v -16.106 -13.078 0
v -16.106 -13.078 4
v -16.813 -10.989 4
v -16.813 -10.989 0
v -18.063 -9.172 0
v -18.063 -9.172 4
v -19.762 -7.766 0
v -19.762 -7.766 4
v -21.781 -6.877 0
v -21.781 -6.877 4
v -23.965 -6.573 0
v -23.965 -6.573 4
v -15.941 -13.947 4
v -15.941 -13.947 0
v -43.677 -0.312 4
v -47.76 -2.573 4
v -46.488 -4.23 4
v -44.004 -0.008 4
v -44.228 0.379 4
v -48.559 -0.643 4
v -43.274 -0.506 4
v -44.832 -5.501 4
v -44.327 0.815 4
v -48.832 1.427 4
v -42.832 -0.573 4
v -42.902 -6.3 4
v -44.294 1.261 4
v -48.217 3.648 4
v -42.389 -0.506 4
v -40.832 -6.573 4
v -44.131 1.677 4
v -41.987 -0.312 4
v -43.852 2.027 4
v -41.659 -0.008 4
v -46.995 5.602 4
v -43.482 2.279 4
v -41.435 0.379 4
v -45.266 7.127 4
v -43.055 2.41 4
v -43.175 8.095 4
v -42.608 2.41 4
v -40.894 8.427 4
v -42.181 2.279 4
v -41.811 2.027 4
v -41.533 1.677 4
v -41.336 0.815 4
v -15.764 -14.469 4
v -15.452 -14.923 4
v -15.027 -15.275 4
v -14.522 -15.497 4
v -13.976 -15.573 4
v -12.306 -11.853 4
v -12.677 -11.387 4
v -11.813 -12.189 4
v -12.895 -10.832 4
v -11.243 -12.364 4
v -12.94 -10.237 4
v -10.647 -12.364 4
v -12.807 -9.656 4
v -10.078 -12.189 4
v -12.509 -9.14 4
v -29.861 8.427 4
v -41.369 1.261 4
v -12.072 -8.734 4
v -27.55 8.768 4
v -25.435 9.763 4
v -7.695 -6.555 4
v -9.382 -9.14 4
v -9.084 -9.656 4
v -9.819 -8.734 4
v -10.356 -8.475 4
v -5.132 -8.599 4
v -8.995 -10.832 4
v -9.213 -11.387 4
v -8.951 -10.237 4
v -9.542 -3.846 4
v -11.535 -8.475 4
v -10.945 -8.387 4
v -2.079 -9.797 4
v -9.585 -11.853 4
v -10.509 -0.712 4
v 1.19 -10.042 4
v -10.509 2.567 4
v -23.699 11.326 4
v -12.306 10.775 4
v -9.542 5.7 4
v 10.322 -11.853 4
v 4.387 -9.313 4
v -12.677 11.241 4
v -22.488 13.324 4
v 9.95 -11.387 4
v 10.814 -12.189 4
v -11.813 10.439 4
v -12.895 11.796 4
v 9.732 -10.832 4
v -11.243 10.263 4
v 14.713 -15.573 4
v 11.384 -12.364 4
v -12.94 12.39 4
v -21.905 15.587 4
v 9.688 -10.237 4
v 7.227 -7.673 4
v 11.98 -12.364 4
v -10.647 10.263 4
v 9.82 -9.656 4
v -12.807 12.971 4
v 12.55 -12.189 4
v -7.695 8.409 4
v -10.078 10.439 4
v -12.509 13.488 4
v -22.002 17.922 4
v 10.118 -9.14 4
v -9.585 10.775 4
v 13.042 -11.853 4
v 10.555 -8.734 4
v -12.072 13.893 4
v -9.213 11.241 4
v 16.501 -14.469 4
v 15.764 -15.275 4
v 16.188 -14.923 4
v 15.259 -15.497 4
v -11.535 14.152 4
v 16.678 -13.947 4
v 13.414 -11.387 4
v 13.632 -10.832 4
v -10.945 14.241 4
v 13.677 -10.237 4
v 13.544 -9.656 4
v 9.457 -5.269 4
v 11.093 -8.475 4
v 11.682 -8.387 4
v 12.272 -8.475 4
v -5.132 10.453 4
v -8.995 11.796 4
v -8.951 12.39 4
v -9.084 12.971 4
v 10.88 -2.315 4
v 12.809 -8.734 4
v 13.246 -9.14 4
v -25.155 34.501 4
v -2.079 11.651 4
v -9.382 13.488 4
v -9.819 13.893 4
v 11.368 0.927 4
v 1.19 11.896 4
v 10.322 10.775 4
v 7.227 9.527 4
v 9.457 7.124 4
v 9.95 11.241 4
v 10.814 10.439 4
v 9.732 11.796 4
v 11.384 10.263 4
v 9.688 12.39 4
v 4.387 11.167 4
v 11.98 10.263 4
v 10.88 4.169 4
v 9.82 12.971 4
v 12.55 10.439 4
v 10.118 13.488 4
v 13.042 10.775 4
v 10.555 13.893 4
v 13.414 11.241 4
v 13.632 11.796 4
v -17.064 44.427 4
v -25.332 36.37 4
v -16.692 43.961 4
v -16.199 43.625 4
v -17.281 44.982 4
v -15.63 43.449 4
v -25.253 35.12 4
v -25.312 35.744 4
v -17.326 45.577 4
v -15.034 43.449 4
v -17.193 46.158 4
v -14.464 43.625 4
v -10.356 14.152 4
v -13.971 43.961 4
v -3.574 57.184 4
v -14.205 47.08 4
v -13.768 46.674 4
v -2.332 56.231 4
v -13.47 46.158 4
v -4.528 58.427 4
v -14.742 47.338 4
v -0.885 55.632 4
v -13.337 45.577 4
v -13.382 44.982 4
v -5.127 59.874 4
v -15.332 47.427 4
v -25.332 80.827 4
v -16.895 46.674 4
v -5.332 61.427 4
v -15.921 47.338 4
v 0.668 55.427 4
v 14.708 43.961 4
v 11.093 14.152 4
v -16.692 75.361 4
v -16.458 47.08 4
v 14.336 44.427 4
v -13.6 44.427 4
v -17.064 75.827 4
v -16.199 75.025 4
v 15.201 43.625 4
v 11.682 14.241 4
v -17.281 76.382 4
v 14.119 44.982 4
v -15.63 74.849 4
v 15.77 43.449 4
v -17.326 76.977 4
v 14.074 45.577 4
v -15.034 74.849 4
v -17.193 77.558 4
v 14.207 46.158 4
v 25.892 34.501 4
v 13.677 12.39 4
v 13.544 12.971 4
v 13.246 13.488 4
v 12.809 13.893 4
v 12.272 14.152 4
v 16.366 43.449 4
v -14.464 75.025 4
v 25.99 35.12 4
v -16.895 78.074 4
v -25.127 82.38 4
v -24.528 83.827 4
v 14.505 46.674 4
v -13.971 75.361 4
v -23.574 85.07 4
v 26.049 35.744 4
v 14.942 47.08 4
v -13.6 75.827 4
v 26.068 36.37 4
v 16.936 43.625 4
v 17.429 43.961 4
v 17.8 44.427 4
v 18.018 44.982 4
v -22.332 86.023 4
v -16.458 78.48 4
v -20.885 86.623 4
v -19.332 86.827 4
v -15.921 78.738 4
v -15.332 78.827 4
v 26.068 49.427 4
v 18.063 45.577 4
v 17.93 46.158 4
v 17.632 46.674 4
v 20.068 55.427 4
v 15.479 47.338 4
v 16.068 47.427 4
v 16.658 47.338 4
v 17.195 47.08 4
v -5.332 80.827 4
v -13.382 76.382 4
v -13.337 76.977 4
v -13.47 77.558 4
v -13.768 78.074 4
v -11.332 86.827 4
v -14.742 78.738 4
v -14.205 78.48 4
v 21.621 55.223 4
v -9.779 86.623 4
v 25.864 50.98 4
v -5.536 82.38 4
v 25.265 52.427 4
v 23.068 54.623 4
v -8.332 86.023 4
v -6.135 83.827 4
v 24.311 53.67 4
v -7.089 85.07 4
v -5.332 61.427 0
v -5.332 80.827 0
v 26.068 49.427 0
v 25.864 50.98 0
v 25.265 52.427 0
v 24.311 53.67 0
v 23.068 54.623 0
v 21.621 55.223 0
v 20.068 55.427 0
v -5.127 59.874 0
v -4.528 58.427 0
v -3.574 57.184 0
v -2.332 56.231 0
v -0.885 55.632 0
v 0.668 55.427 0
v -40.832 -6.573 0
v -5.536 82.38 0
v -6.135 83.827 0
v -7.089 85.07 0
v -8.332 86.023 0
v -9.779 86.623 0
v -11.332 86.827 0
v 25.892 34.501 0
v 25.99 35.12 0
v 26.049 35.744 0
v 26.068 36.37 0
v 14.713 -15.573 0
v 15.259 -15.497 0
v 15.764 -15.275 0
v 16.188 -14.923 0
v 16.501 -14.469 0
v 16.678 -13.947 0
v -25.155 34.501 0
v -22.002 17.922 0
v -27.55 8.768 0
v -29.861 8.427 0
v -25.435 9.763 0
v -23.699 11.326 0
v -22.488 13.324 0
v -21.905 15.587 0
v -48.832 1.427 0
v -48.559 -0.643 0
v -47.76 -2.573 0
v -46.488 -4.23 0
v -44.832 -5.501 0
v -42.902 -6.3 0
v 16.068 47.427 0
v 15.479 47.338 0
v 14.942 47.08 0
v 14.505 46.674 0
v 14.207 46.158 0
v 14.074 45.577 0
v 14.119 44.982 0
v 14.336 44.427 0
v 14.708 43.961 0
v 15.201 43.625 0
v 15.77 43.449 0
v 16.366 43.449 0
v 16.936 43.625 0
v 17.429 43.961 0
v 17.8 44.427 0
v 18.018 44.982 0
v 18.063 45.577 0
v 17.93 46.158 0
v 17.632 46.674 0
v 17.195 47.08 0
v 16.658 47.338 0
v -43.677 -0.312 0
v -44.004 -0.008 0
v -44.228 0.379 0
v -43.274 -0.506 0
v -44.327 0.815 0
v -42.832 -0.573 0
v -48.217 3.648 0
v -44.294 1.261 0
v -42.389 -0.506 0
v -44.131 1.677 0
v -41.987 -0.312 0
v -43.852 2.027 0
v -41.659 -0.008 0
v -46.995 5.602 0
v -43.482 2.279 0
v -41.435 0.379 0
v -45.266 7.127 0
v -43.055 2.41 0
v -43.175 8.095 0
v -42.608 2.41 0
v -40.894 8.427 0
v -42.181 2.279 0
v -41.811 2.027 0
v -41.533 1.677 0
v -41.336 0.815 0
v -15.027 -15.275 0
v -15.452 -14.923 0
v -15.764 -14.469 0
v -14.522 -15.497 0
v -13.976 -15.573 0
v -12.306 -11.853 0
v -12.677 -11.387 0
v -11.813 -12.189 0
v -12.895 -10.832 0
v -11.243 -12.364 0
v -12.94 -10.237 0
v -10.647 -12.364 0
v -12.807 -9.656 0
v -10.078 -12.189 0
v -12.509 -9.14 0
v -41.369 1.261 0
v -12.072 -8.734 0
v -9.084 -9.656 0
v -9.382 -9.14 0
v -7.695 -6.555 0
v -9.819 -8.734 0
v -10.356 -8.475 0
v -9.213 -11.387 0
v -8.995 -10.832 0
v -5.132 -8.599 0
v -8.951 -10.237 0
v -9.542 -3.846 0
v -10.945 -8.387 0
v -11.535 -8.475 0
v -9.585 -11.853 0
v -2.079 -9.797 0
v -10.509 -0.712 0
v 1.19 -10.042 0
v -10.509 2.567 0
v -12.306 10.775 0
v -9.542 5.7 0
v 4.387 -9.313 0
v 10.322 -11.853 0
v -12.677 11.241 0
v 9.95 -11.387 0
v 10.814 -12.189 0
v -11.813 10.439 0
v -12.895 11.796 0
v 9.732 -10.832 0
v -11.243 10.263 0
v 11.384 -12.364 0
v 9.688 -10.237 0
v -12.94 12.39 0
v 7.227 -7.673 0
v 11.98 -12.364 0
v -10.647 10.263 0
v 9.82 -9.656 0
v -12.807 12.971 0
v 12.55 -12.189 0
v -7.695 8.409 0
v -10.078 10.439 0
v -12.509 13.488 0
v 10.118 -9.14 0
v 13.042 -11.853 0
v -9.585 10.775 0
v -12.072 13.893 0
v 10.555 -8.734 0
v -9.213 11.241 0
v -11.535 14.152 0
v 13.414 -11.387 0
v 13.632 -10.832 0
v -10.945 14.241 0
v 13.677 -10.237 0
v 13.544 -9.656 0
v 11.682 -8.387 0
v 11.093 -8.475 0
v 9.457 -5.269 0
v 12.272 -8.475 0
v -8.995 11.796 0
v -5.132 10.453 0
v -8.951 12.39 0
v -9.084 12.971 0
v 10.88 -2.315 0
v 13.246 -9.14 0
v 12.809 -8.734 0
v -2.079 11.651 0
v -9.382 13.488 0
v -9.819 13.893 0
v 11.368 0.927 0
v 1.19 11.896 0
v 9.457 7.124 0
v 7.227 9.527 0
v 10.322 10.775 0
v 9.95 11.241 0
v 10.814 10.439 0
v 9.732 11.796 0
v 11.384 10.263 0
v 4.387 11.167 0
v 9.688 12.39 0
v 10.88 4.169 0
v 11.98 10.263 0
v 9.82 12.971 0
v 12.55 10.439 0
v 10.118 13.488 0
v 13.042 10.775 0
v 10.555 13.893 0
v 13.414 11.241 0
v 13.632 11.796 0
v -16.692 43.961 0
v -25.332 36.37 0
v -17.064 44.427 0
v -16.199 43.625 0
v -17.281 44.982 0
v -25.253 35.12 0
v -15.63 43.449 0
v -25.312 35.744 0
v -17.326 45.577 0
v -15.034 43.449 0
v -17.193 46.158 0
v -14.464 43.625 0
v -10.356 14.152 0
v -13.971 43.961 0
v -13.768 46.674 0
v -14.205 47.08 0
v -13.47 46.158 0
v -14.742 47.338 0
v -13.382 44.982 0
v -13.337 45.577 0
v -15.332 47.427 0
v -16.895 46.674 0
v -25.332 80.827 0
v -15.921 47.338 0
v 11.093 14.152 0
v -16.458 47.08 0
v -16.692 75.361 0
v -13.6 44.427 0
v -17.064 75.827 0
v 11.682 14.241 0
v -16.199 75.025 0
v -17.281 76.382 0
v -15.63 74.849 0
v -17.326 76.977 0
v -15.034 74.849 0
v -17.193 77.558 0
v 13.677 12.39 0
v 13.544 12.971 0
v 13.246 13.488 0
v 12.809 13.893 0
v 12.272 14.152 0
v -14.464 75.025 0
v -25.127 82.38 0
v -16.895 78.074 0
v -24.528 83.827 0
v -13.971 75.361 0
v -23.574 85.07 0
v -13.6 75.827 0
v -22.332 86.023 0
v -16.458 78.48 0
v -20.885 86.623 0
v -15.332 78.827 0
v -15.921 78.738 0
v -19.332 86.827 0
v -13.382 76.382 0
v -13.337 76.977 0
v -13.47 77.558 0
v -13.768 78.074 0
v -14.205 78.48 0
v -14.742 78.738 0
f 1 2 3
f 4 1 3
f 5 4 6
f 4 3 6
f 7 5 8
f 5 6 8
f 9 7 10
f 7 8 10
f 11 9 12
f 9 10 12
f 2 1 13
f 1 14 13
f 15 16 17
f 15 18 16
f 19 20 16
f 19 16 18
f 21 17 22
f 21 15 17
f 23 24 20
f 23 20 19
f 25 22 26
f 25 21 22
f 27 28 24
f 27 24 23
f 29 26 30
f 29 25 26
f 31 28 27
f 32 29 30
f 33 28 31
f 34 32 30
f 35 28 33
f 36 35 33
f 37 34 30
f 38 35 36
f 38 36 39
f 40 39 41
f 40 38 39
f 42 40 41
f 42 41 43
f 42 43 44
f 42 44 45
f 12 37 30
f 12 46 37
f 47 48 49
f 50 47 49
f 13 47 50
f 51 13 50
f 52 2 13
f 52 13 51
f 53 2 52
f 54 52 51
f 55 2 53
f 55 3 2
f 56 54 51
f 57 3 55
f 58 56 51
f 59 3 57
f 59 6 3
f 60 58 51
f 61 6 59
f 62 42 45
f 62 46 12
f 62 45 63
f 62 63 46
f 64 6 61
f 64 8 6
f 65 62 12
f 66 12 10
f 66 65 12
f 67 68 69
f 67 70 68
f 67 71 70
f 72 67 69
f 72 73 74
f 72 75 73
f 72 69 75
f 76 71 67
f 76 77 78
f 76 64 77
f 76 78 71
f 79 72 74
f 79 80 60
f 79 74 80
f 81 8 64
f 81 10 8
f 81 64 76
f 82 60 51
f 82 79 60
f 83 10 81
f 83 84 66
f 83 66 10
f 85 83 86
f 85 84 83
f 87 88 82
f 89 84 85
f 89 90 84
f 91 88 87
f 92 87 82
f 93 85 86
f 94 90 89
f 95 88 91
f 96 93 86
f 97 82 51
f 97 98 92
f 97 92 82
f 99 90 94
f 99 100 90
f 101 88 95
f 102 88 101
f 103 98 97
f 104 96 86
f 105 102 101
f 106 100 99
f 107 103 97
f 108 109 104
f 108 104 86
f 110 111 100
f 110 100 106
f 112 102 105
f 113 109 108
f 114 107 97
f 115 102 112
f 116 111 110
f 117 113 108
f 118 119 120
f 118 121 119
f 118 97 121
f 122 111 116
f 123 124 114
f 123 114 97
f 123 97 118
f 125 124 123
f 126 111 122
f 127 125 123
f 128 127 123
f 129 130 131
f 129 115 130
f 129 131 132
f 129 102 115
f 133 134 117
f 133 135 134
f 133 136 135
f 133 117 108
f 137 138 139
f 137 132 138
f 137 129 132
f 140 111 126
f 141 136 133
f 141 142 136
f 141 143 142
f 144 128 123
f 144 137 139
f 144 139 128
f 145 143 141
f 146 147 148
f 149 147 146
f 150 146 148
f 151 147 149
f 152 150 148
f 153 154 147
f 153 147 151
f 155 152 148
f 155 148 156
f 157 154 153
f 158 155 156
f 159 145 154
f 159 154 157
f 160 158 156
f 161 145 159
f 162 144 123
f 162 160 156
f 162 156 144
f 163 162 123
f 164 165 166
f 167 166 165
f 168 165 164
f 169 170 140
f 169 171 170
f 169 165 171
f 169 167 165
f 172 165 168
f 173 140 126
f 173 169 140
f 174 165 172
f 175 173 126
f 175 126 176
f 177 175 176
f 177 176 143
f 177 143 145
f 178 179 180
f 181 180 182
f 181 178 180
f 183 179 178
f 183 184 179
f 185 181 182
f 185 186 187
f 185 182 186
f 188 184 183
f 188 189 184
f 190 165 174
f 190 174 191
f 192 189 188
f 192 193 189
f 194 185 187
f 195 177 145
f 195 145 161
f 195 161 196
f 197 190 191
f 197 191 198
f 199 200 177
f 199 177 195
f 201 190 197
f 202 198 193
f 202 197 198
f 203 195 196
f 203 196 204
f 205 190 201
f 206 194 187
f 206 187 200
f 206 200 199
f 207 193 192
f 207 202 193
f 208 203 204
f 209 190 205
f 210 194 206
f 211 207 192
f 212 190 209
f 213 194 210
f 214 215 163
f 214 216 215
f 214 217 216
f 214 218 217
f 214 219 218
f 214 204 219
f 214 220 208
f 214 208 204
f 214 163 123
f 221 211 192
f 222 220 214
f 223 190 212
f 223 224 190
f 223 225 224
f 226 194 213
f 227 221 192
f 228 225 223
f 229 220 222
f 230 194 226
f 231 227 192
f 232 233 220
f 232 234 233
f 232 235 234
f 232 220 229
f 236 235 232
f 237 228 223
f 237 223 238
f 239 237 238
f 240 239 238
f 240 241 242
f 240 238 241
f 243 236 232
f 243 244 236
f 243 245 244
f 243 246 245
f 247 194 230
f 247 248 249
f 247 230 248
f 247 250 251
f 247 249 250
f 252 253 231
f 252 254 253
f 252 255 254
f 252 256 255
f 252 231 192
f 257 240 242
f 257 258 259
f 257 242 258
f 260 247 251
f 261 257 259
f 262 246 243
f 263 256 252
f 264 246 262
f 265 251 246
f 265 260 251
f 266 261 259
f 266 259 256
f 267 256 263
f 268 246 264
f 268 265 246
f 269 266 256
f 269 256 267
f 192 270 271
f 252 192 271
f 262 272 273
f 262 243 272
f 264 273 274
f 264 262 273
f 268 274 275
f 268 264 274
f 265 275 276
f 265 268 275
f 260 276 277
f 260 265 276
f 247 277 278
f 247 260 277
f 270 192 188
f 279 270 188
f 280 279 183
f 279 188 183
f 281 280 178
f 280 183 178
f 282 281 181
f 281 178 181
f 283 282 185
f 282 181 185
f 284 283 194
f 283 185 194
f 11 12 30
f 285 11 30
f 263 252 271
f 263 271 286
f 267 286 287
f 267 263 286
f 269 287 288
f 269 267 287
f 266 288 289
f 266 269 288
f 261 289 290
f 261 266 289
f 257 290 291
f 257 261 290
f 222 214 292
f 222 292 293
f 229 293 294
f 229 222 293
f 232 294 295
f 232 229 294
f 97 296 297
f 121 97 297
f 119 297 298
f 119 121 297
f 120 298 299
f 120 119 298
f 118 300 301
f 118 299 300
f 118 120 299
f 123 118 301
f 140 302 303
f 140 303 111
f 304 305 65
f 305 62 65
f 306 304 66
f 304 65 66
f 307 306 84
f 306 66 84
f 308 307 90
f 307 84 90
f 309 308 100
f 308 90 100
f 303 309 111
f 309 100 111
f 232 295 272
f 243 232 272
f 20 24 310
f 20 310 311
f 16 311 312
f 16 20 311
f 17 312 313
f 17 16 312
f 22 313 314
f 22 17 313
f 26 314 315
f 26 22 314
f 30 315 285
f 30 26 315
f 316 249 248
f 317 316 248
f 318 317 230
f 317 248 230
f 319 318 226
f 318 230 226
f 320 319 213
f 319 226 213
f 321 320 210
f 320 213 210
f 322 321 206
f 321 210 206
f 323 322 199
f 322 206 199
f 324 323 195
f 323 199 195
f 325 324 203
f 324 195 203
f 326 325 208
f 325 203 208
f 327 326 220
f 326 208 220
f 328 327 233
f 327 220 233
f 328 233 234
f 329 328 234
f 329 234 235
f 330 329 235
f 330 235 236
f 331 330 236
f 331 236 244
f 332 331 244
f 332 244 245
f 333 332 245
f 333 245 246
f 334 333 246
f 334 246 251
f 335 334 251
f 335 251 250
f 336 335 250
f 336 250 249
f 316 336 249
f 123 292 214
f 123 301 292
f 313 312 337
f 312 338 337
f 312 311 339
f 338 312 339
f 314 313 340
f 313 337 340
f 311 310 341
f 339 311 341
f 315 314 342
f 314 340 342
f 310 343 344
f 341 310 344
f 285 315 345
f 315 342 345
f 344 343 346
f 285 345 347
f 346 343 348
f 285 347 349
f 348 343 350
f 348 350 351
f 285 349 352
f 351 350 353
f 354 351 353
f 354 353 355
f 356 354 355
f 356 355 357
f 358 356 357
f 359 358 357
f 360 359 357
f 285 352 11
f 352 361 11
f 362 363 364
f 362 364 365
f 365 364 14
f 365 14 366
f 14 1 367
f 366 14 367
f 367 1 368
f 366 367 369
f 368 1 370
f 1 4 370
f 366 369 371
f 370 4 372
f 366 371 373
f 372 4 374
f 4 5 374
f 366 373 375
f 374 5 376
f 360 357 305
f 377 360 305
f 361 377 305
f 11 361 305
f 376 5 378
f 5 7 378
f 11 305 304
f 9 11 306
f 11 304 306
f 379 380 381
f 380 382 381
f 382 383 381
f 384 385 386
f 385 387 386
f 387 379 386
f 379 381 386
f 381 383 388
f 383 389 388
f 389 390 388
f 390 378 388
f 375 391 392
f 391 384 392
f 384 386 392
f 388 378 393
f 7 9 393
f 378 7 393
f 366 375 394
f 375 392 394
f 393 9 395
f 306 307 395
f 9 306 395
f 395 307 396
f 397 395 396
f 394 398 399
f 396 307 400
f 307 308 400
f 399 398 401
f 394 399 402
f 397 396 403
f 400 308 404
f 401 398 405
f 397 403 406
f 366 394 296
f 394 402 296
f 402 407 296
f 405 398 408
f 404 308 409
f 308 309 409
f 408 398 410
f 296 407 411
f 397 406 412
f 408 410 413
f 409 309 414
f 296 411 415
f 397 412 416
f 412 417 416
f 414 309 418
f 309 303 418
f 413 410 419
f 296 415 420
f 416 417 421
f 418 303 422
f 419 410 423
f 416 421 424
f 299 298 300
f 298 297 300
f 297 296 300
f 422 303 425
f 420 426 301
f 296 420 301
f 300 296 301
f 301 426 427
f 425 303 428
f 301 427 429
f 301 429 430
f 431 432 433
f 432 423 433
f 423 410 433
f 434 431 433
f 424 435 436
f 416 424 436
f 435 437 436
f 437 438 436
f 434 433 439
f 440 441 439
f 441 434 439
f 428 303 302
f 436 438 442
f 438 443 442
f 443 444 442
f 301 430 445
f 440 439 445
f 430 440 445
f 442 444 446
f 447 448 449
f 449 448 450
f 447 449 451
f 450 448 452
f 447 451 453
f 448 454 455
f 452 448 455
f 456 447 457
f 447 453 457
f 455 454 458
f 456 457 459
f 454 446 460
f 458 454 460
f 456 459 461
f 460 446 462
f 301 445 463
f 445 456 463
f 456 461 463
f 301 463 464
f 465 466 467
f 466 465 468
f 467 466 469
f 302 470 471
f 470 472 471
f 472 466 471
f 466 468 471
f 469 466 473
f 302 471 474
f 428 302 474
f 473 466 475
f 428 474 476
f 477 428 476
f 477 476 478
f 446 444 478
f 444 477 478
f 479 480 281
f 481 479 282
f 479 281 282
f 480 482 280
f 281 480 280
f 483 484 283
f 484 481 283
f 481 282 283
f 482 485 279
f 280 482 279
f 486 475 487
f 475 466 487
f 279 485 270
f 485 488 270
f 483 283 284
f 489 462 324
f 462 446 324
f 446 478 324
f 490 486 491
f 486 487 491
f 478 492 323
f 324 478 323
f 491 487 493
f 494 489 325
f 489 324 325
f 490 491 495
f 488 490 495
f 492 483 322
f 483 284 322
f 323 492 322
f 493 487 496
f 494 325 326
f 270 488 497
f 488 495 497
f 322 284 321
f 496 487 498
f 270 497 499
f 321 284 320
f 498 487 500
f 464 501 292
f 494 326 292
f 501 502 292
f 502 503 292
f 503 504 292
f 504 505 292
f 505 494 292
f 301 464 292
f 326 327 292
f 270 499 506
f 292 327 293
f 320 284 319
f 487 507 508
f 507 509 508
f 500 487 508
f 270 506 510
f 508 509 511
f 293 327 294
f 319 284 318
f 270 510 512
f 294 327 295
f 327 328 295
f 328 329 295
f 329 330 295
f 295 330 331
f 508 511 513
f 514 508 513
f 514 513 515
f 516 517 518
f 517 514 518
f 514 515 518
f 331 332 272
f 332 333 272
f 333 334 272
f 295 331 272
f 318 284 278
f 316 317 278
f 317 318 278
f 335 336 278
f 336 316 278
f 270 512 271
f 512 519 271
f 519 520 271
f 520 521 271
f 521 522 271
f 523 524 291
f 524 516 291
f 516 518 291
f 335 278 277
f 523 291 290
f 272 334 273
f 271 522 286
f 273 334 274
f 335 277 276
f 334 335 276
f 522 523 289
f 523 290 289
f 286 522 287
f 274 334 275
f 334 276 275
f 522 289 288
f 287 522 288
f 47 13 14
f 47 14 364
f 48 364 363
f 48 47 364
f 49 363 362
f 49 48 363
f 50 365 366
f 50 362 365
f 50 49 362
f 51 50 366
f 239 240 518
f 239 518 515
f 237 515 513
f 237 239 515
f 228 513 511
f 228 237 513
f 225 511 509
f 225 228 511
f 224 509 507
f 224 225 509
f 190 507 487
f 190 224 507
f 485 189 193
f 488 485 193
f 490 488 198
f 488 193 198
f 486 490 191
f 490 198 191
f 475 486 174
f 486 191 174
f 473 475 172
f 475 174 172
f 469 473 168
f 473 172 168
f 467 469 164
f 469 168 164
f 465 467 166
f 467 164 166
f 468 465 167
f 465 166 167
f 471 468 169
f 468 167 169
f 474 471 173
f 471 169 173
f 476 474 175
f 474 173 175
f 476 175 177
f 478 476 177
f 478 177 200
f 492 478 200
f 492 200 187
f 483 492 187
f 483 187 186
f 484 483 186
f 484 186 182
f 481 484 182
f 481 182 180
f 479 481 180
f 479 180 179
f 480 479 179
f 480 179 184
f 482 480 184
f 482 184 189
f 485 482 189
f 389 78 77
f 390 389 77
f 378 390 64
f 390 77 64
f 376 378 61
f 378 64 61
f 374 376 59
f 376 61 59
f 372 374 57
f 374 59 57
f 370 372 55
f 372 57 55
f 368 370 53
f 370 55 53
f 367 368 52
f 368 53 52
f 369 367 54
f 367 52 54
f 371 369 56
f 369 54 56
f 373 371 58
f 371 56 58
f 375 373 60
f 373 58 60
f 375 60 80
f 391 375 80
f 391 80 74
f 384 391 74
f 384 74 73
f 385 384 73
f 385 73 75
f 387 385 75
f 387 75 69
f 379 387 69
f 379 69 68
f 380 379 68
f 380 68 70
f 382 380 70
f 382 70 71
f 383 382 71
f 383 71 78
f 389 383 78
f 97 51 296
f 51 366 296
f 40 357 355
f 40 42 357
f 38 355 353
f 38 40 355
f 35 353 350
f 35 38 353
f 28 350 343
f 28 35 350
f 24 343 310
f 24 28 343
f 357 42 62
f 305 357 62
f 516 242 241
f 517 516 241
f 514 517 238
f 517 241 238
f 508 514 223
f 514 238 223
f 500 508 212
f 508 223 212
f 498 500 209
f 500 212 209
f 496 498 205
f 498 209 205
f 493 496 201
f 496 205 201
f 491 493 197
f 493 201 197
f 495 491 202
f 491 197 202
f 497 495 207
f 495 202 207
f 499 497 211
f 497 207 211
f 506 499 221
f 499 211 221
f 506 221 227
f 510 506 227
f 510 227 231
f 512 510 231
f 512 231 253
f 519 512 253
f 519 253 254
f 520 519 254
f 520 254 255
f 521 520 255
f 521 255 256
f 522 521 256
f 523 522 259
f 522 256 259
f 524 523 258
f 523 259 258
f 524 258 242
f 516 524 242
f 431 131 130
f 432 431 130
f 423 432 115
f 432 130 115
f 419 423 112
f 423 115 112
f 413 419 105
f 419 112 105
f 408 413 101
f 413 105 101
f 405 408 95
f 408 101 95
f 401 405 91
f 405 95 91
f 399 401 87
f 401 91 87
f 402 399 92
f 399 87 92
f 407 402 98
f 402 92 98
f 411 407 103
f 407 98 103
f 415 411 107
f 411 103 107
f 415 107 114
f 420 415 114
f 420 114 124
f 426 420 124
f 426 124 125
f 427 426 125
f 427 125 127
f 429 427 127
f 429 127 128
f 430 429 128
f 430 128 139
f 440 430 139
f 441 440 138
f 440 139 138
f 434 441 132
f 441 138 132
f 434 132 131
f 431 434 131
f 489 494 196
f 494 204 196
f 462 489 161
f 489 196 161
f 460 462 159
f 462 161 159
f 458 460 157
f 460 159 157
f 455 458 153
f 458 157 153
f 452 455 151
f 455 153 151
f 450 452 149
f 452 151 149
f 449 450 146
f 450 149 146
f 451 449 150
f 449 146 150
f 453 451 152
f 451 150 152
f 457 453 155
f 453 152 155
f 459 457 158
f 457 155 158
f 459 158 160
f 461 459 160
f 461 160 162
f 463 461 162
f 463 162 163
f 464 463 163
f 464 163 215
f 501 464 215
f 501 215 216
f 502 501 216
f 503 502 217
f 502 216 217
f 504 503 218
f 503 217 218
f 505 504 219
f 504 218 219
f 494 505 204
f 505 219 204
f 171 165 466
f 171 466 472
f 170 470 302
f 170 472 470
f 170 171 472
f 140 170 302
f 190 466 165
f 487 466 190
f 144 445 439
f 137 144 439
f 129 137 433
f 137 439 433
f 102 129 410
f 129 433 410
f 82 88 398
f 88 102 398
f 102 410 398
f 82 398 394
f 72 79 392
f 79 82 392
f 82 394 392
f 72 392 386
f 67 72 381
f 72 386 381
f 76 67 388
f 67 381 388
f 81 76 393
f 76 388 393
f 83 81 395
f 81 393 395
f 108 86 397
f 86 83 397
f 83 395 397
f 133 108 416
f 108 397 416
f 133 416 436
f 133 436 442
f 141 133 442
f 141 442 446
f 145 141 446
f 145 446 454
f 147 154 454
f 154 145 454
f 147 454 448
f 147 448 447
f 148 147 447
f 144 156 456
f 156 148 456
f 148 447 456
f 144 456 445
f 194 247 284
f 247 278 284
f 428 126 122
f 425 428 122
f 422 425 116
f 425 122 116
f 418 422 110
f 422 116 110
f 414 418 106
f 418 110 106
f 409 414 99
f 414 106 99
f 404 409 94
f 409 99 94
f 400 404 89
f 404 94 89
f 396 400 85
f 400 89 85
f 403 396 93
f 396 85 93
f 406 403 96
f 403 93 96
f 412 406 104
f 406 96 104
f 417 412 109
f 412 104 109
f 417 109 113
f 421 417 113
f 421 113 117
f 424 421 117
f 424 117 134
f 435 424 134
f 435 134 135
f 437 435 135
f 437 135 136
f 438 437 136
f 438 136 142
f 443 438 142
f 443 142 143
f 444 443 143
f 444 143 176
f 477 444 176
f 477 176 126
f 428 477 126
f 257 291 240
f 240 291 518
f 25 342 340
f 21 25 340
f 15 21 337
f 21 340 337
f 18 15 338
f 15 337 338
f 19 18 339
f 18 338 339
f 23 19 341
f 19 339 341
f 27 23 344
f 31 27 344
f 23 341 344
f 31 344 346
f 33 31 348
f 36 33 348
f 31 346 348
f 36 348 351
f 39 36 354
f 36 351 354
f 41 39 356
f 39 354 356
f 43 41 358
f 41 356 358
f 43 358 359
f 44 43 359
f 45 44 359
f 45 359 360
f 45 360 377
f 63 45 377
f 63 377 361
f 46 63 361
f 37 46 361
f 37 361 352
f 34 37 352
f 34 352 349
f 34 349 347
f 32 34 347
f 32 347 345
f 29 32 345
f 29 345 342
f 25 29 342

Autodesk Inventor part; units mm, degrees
ref_plane "YZ Plane" through (0, 0, 0) normal (1, 0, 0) x (0, 1, 0)
ref_plane "XZ Plane" through (0, 0, 0) normal (0, 1, 0) x (-1, 0, 0)
ref_plane "XY Plane" through (0, 0, 0) normal (0, 0, 1) x (1, 0, 0)
sketch "Szkic1" plane through (0, 0, 0) normal (0, 0, 1) x (1, 0, 0)
  line L0 (-25.3316, -15.5729) -> (26.0684, -15.5729)
  line L1 (26.0684, -15.5729) -> (26.0684, 35.4271)
  line L2 (26.0684, 35.4271) -> (26.0684, 35.4271)
  line L3 (26.0684, 35.4271) -> (26.0684, 55.4271)
  line L4 (26.0684, 55.4271) -> (-5.3316, 55.4271)
  line L5 (-5.3316, 55.4271) -> (-5.3316, 86.8271)
  line L6 (-5.3316, 86.8271) -> (-25.3316, 86.8271)
  line L7 (-25.3316, -15.5729) -> (-25.3316, 86.8271)
  line L8 (-15.6316, 16.9271) -> (16.3684, 16.9271)
  line L9 (16.3684, 16.9271) -> (16.3684, -15.0729)
  line L10 (16.3684, -15.0729) -> (-15.6316, -15.0729)
  line L11 (-15.6316, -15.0729) -> (-15.6316, 16.9271)
  circle A0 centre (0.3684, 0.9271) radius 11
  circle A1 centre (0.3684, 0.9271) radius 16
  point P0 (0, 0)
  point P1 (-10.9453, 12.2408)
  point P2 (11.6821, 12.2408)
  point P3 (11.6821, -10.3866)
  point P4 (-10.9453, -10.3866)
  point P5 (16.0684, 45.4271)
  point P6 (-15.3316, 76.8271)
  point P7 (-15.3316, 45.4271)
  dimension "d0" = 20
  dimension "d1" = 20
  dimension "d2" = 51.4
  dimension "d3" = 51.4
  dimension "d4" = 34.5
  dimension "d5" = 25.7
  dimension "d6" = 51.4
  dimension "d7" = 51
  dimension "d8" = 32
  dimension "d9" = 32
  dimension "d10" = 16
  dimension "d11" = 16
  dimension "d12" = 22
  dimension "d13" = 32
  dimension "d23" = 10
  dimension "d24" = 10
  dimension "d25" = 10
  dimension "d26" = 10
  dimension "d27" = 10
  dimension "d28" = 10
extrude "Wyciągnięcie proste1" add sketch "Szkic1" along normal blind 4 contours L7 L6 L5 L4 L3 L1 L0 | L8 A1 L11 | L8 L9 A1 | A1 | A1 L10 L11 | L9 L10 A1
hole "Otwór1" at (0.3684, 0.9271, 0) at (-10.9453, 12.2408, 0) at (11.6821, 12.2408, 0) at (11.6821, -10.3866, 0) at (-10.9453, -10.3866, 0) direction (0, 0, 1) diameter 4 end through all
hole "Otwór2" at (16.0684, 45.4271, 0) at (-15.3316, 76.8271, 0) at (-15.3316, 45.4271, 0) direction (0, 0, 1) diameter 4 end through all
chamfer "Faza1" distance 51 distance2 9.7 1 edges at (-25.3316, -15.5729, 2) measured on face at (-25.3316, 18.5605, 1.3333)
chamfer "Faza2" distance 51 distance2 9.7 1 edges at (26.0684, -15.5729, 2) measured on face at (26.0684, 31.7605, 1.3333)
fillet "Zaokrąglenie2" radius 6 4 edges at (-5.3316, 55.4271, 2) (26.0684, 55.4271, 2) (-5.3316, 86.8271, 2) (-25.3316, 86.8271, 2)
fillet "Zaokrąglenie3" radius 10 2 edges at (-25.3316, 35.4271, 2) (26.0684, 35.4271, 2)
sketch "Szkic2" plane through (0, 0, 4) normal (0, 0, 1) x (1, 0, 0)
  arc A0 (25.8923, 34.5012) -> (26.0684, 36.3697) centre (16.0684, 36.3697) ccw projected
  line L0 (26.0684, 36.3697) -> (26.0684, 49.4271) projected
  arc A1 (26.0684, 49.4271) -> (20.0684, 55.4271) centre (20.0684, 49.4271) ccw projected
  line L1 (20.0684, 55.4271) -> (0.6684, 55.4271) projected
  arc A2 (-5.3316, 61.4271) -> (0.6684, 55.4271) centre (0.6684, 61.4271) ccw projected
  line L2 (-5.3316, 61.4271) -> (-5.3316, 80.8271) projected
  arc A3 (-5.3316, 80.8271) -> (-11.3316, 86.8271) centre (-11.3316, 80.8271) ccw projected
  line L3 (-11.3316, 86.8271) -> (-19.3316, 86.8271) projected
  arc A4 (-19.3316, 86.8271) -> (-25.3316, 80.8271) centre (-19.3316, 80.8271) ccw projected
  line L4 (-25.3316, 80.8271) -> (-25.3316, 36.3697) projected
  arc A5 (-25.3316, 36.3697) -> (-25.1555, 34.5012) centre (-15.3316, 36.3697) ccw projected
  line L5 (-15.6316, -15.5729) -> (-25.1555, 34.5012) projected
  line L6 (-15.6316, -15.5729) -> (16.3684, -15.5729) projected
  line L7 (25.8923, 34.5012) -> (16.3684, -15.5729) projected
  circle A6 centre (-15.3316, 76.8271) radius 2 projected
  circle A7 centre (16.0684, 45.4271) radius 2 projected
  circle A8 centre (-15.3316, 45.4271) radius 2 projected
  circle A9 centre (11.6821, -10.3866) radius 2 projected
  circle A10 centre (-10.9453, 12.2408) radius 2 projected
  circle A11 centre (11.6821, 12.2408) radius 2 projected
  circle A12 centre (-10.9453, -10.3866) radius 2 projected
  circle A13 centre (0.3684, 0.9271) radius 11 projected
  line L8 (-17.3434, -6.5729) -> (-48.8316, -6.5729)
  line L9 (-48.8316, -6.5729) -> (-48.8316, 8.4271)
  line L10 (-48.8316, 8.4271) -> (-20.1963, 8.4271)
  point P0 (0, 0)
  point P1 (-42.8316, 0.9271)
  dimension "d45" = 15
  dimension "d46" = 9
  dimension "d47" = 23.5
  dimension "d50" = 7.5
  dimension "d51" = 6
extrude "Wyciągnięcie proste2" add sketch "Szkic2" against normal blind 4 contours L8 L9 L10 L5
hole "Otwór3" at (-42.8316, 0.9271, 4) direction (0, 0, -1) diameter 3 end through all
fillet "Zaokrąglenie4" radius 8 4 edges at (-17.3434, -6.5729, 2) (-20.1963, 8.4271, 2) (-48.8316, -6.5729, 2) (-48.8316, 8.4271, 2)
fillet "Zaokrąglenie5" radius 2 2 edges at (-15.6316, -15.5729, 2) (16.3684, -15.5729, 2)
equation "\"d1\" = d0"
equation "\"d2\" = d6"
equation "\"d3\" = d6"
equation "\"d6\" = 2 * d5"
equation "\"d10\" = 0.5 * d9"
equation "\"d11\" = 0.5 * d8"
equation "\"d25\" = 0.5 * d1"
equation "\"d26\" = 0.5 * d0"
equation "\"d27\" = d25"
equation "\"d28\" = d26"
equation "\"d50\" = 0.5 * d45"
properties part number "LC_ALU_4mm_Heatbed_Frame_Linear_Bearing_Mounting_Bracket_Z_endstop"
